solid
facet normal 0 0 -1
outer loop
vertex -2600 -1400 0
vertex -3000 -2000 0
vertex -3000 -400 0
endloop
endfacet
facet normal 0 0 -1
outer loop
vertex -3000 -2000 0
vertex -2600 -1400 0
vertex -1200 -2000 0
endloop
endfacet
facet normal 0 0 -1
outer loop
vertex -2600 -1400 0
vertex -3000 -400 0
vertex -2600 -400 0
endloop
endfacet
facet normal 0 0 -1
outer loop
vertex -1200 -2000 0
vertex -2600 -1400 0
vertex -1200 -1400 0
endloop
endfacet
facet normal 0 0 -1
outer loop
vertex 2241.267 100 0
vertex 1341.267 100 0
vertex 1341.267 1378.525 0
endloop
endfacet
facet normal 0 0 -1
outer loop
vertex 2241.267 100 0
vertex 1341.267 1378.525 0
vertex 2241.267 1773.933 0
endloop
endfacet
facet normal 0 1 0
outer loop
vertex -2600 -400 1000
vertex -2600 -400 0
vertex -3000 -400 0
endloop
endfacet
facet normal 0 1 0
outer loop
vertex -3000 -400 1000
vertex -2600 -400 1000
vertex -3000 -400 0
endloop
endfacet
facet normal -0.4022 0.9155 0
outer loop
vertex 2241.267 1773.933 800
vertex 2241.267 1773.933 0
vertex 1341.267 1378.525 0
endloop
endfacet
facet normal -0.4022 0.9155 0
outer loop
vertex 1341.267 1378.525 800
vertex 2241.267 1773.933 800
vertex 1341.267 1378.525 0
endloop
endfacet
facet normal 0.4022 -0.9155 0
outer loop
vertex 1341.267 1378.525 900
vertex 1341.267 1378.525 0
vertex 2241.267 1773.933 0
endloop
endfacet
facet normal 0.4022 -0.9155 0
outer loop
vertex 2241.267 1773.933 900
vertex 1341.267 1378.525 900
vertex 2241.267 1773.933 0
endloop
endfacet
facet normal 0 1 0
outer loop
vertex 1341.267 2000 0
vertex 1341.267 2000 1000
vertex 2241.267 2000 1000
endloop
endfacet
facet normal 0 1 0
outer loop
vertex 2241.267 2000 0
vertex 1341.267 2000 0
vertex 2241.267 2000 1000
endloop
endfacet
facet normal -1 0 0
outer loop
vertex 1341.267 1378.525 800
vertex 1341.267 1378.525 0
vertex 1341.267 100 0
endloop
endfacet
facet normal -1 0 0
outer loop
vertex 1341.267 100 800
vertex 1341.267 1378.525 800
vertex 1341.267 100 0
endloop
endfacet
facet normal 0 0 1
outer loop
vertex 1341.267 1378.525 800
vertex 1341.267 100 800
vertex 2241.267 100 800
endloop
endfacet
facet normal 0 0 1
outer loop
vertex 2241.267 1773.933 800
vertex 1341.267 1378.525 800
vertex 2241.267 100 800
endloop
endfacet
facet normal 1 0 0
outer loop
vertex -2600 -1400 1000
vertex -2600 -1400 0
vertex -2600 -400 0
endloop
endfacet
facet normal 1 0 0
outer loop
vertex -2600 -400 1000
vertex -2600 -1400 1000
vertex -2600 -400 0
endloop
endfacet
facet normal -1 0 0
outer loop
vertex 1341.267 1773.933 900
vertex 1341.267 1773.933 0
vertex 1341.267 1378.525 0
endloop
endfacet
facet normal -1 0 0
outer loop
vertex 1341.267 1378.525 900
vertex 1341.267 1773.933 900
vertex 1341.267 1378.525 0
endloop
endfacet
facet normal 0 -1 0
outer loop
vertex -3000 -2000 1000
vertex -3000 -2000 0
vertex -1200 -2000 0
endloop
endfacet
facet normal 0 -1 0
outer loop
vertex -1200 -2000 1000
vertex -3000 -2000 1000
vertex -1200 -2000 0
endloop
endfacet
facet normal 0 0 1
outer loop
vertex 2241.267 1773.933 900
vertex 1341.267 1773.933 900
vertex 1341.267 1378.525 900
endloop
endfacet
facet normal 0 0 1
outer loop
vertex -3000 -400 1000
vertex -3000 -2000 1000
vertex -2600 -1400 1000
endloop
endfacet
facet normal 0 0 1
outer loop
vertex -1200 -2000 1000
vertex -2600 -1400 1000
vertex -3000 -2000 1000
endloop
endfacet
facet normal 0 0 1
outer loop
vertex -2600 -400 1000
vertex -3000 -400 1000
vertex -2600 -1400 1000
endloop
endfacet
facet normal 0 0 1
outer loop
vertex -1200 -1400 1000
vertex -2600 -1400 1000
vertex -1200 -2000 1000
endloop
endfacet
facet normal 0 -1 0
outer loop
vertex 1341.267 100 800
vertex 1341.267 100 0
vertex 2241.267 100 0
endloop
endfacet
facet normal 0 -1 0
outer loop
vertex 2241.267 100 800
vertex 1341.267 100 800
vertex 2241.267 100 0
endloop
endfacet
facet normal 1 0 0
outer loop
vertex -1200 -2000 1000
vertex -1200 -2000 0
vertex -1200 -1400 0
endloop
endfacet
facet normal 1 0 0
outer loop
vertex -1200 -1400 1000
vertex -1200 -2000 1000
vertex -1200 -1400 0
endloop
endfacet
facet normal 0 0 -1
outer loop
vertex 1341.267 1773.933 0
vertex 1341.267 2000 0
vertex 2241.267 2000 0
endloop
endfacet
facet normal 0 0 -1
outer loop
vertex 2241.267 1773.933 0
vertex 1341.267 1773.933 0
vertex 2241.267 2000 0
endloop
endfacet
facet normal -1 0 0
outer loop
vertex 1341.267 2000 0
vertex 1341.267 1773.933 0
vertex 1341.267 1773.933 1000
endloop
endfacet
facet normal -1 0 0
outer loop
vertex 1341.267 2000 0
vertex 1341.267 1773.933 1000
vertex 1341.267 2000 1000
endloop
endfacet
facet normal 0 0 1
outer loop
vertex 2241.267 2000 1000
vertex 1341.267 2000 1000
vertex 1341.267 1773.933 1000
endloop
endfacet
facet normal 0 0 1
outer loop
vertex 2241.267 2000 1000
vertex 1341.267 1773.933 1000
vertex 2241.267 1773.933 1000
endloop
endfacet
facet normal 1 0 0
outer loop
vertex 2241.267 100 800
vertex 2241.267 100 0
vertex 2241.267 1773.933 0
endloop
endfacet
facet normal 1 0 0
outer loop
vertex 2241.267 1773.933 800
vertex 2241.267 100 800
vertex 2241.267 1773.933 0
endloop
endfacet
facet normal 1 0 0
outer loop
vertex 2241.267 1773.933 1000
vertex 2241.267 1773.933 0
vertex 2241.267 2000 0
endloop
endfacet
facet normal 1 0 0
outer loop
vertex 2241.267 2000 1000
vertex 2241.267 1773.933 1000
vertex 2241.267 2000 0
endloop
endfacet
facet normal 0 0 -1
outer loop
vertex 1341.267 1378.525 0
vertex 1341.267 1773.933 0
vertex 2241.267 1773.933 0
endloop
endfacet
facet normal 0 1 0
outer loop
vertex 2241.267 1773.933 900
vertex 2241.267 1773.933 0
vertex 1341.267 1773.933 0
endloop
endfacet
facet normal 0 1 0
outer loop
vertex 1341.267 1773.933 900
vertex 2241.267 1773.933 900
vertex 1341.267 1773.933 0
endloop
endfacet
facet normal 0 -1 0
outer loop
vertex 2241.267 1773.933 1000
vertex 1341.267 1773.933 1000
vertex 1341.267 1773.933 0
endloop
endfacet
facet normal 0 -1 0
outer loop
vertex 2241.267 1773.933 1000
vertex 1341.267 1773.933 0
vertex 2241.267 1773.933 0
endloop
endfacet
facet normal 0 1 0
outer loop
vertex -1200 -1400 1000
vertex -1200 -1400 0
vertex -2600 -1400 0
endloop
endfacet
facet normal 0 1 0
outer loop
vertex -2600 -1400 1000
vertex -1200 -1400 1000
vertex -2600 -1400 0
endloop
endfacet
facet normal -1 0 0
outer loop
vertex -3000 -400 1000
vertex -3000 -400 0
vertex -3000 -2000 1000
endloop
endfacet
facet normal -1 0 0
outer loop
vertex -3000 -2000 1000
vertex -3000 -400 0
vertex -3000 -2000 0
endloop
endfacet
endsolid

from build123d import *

# Parameters (mm, degrees)
F1_DEPTH = 1000
F0_W     = 900
F0_H     = 226.0670661926
F2_DEPTH = 800
F3_DEPTH = 900


# Not quite as in the source:
# - ends of sketch curves that miss each other by under 0.0002 mm in the source are joined


with BuildPart() as f1:
    # F0 (on Top) → F1 (new body)
    with BuildSketch(Plane.XY):
        Polygon((-3000, -2000), (-1199.9999046326, -2000), (-1199.9999046326, -1399.9999761581), (-2599.9999046326, -1399.9999761581), (-2599.9999046326, -399.9999761581), (-2999.9999046326, -399.9999761581), align=None)
    extrude(amount=F1_DEPTH)


with BuildPart() as f1b:
    # F0 (on Top) → F1, piece 2 (new body)
    with BuildSketch(Plane.XY):
        with Locations((1791.2673473358, 1886.9664669037)):
            Rectangle(F0_W, F0_H)
    extrude(amount=F1_DEPTH)


with BuildPart() as f2:
    # F0 (on Top) → F2 (new body)
    with BuildSketch(Plane.XY):
        Polygon((2241.2673473358, 100), (2241.2673473358, 1773.9329338074), (1341.2673473358, 1378.5252571106), (1341.2673473358, 100), align=None)
    extrude(amount=F2_DEPTH)


with BuildPart() as f3:
    # F0 (on Top) → F3 (new body)
    with BuildSketch(Plane.XY):
        Polygon((1341.2673473358, 1378.5252571106), (2241.2673473358, 1773.9329338074), (1341.2673473358, 1773.9329338074), align=None)
    extrude(amount=F3_DEPTH)


solid = Compound([f1.part, f1b.part, f2.part, f3.part])
